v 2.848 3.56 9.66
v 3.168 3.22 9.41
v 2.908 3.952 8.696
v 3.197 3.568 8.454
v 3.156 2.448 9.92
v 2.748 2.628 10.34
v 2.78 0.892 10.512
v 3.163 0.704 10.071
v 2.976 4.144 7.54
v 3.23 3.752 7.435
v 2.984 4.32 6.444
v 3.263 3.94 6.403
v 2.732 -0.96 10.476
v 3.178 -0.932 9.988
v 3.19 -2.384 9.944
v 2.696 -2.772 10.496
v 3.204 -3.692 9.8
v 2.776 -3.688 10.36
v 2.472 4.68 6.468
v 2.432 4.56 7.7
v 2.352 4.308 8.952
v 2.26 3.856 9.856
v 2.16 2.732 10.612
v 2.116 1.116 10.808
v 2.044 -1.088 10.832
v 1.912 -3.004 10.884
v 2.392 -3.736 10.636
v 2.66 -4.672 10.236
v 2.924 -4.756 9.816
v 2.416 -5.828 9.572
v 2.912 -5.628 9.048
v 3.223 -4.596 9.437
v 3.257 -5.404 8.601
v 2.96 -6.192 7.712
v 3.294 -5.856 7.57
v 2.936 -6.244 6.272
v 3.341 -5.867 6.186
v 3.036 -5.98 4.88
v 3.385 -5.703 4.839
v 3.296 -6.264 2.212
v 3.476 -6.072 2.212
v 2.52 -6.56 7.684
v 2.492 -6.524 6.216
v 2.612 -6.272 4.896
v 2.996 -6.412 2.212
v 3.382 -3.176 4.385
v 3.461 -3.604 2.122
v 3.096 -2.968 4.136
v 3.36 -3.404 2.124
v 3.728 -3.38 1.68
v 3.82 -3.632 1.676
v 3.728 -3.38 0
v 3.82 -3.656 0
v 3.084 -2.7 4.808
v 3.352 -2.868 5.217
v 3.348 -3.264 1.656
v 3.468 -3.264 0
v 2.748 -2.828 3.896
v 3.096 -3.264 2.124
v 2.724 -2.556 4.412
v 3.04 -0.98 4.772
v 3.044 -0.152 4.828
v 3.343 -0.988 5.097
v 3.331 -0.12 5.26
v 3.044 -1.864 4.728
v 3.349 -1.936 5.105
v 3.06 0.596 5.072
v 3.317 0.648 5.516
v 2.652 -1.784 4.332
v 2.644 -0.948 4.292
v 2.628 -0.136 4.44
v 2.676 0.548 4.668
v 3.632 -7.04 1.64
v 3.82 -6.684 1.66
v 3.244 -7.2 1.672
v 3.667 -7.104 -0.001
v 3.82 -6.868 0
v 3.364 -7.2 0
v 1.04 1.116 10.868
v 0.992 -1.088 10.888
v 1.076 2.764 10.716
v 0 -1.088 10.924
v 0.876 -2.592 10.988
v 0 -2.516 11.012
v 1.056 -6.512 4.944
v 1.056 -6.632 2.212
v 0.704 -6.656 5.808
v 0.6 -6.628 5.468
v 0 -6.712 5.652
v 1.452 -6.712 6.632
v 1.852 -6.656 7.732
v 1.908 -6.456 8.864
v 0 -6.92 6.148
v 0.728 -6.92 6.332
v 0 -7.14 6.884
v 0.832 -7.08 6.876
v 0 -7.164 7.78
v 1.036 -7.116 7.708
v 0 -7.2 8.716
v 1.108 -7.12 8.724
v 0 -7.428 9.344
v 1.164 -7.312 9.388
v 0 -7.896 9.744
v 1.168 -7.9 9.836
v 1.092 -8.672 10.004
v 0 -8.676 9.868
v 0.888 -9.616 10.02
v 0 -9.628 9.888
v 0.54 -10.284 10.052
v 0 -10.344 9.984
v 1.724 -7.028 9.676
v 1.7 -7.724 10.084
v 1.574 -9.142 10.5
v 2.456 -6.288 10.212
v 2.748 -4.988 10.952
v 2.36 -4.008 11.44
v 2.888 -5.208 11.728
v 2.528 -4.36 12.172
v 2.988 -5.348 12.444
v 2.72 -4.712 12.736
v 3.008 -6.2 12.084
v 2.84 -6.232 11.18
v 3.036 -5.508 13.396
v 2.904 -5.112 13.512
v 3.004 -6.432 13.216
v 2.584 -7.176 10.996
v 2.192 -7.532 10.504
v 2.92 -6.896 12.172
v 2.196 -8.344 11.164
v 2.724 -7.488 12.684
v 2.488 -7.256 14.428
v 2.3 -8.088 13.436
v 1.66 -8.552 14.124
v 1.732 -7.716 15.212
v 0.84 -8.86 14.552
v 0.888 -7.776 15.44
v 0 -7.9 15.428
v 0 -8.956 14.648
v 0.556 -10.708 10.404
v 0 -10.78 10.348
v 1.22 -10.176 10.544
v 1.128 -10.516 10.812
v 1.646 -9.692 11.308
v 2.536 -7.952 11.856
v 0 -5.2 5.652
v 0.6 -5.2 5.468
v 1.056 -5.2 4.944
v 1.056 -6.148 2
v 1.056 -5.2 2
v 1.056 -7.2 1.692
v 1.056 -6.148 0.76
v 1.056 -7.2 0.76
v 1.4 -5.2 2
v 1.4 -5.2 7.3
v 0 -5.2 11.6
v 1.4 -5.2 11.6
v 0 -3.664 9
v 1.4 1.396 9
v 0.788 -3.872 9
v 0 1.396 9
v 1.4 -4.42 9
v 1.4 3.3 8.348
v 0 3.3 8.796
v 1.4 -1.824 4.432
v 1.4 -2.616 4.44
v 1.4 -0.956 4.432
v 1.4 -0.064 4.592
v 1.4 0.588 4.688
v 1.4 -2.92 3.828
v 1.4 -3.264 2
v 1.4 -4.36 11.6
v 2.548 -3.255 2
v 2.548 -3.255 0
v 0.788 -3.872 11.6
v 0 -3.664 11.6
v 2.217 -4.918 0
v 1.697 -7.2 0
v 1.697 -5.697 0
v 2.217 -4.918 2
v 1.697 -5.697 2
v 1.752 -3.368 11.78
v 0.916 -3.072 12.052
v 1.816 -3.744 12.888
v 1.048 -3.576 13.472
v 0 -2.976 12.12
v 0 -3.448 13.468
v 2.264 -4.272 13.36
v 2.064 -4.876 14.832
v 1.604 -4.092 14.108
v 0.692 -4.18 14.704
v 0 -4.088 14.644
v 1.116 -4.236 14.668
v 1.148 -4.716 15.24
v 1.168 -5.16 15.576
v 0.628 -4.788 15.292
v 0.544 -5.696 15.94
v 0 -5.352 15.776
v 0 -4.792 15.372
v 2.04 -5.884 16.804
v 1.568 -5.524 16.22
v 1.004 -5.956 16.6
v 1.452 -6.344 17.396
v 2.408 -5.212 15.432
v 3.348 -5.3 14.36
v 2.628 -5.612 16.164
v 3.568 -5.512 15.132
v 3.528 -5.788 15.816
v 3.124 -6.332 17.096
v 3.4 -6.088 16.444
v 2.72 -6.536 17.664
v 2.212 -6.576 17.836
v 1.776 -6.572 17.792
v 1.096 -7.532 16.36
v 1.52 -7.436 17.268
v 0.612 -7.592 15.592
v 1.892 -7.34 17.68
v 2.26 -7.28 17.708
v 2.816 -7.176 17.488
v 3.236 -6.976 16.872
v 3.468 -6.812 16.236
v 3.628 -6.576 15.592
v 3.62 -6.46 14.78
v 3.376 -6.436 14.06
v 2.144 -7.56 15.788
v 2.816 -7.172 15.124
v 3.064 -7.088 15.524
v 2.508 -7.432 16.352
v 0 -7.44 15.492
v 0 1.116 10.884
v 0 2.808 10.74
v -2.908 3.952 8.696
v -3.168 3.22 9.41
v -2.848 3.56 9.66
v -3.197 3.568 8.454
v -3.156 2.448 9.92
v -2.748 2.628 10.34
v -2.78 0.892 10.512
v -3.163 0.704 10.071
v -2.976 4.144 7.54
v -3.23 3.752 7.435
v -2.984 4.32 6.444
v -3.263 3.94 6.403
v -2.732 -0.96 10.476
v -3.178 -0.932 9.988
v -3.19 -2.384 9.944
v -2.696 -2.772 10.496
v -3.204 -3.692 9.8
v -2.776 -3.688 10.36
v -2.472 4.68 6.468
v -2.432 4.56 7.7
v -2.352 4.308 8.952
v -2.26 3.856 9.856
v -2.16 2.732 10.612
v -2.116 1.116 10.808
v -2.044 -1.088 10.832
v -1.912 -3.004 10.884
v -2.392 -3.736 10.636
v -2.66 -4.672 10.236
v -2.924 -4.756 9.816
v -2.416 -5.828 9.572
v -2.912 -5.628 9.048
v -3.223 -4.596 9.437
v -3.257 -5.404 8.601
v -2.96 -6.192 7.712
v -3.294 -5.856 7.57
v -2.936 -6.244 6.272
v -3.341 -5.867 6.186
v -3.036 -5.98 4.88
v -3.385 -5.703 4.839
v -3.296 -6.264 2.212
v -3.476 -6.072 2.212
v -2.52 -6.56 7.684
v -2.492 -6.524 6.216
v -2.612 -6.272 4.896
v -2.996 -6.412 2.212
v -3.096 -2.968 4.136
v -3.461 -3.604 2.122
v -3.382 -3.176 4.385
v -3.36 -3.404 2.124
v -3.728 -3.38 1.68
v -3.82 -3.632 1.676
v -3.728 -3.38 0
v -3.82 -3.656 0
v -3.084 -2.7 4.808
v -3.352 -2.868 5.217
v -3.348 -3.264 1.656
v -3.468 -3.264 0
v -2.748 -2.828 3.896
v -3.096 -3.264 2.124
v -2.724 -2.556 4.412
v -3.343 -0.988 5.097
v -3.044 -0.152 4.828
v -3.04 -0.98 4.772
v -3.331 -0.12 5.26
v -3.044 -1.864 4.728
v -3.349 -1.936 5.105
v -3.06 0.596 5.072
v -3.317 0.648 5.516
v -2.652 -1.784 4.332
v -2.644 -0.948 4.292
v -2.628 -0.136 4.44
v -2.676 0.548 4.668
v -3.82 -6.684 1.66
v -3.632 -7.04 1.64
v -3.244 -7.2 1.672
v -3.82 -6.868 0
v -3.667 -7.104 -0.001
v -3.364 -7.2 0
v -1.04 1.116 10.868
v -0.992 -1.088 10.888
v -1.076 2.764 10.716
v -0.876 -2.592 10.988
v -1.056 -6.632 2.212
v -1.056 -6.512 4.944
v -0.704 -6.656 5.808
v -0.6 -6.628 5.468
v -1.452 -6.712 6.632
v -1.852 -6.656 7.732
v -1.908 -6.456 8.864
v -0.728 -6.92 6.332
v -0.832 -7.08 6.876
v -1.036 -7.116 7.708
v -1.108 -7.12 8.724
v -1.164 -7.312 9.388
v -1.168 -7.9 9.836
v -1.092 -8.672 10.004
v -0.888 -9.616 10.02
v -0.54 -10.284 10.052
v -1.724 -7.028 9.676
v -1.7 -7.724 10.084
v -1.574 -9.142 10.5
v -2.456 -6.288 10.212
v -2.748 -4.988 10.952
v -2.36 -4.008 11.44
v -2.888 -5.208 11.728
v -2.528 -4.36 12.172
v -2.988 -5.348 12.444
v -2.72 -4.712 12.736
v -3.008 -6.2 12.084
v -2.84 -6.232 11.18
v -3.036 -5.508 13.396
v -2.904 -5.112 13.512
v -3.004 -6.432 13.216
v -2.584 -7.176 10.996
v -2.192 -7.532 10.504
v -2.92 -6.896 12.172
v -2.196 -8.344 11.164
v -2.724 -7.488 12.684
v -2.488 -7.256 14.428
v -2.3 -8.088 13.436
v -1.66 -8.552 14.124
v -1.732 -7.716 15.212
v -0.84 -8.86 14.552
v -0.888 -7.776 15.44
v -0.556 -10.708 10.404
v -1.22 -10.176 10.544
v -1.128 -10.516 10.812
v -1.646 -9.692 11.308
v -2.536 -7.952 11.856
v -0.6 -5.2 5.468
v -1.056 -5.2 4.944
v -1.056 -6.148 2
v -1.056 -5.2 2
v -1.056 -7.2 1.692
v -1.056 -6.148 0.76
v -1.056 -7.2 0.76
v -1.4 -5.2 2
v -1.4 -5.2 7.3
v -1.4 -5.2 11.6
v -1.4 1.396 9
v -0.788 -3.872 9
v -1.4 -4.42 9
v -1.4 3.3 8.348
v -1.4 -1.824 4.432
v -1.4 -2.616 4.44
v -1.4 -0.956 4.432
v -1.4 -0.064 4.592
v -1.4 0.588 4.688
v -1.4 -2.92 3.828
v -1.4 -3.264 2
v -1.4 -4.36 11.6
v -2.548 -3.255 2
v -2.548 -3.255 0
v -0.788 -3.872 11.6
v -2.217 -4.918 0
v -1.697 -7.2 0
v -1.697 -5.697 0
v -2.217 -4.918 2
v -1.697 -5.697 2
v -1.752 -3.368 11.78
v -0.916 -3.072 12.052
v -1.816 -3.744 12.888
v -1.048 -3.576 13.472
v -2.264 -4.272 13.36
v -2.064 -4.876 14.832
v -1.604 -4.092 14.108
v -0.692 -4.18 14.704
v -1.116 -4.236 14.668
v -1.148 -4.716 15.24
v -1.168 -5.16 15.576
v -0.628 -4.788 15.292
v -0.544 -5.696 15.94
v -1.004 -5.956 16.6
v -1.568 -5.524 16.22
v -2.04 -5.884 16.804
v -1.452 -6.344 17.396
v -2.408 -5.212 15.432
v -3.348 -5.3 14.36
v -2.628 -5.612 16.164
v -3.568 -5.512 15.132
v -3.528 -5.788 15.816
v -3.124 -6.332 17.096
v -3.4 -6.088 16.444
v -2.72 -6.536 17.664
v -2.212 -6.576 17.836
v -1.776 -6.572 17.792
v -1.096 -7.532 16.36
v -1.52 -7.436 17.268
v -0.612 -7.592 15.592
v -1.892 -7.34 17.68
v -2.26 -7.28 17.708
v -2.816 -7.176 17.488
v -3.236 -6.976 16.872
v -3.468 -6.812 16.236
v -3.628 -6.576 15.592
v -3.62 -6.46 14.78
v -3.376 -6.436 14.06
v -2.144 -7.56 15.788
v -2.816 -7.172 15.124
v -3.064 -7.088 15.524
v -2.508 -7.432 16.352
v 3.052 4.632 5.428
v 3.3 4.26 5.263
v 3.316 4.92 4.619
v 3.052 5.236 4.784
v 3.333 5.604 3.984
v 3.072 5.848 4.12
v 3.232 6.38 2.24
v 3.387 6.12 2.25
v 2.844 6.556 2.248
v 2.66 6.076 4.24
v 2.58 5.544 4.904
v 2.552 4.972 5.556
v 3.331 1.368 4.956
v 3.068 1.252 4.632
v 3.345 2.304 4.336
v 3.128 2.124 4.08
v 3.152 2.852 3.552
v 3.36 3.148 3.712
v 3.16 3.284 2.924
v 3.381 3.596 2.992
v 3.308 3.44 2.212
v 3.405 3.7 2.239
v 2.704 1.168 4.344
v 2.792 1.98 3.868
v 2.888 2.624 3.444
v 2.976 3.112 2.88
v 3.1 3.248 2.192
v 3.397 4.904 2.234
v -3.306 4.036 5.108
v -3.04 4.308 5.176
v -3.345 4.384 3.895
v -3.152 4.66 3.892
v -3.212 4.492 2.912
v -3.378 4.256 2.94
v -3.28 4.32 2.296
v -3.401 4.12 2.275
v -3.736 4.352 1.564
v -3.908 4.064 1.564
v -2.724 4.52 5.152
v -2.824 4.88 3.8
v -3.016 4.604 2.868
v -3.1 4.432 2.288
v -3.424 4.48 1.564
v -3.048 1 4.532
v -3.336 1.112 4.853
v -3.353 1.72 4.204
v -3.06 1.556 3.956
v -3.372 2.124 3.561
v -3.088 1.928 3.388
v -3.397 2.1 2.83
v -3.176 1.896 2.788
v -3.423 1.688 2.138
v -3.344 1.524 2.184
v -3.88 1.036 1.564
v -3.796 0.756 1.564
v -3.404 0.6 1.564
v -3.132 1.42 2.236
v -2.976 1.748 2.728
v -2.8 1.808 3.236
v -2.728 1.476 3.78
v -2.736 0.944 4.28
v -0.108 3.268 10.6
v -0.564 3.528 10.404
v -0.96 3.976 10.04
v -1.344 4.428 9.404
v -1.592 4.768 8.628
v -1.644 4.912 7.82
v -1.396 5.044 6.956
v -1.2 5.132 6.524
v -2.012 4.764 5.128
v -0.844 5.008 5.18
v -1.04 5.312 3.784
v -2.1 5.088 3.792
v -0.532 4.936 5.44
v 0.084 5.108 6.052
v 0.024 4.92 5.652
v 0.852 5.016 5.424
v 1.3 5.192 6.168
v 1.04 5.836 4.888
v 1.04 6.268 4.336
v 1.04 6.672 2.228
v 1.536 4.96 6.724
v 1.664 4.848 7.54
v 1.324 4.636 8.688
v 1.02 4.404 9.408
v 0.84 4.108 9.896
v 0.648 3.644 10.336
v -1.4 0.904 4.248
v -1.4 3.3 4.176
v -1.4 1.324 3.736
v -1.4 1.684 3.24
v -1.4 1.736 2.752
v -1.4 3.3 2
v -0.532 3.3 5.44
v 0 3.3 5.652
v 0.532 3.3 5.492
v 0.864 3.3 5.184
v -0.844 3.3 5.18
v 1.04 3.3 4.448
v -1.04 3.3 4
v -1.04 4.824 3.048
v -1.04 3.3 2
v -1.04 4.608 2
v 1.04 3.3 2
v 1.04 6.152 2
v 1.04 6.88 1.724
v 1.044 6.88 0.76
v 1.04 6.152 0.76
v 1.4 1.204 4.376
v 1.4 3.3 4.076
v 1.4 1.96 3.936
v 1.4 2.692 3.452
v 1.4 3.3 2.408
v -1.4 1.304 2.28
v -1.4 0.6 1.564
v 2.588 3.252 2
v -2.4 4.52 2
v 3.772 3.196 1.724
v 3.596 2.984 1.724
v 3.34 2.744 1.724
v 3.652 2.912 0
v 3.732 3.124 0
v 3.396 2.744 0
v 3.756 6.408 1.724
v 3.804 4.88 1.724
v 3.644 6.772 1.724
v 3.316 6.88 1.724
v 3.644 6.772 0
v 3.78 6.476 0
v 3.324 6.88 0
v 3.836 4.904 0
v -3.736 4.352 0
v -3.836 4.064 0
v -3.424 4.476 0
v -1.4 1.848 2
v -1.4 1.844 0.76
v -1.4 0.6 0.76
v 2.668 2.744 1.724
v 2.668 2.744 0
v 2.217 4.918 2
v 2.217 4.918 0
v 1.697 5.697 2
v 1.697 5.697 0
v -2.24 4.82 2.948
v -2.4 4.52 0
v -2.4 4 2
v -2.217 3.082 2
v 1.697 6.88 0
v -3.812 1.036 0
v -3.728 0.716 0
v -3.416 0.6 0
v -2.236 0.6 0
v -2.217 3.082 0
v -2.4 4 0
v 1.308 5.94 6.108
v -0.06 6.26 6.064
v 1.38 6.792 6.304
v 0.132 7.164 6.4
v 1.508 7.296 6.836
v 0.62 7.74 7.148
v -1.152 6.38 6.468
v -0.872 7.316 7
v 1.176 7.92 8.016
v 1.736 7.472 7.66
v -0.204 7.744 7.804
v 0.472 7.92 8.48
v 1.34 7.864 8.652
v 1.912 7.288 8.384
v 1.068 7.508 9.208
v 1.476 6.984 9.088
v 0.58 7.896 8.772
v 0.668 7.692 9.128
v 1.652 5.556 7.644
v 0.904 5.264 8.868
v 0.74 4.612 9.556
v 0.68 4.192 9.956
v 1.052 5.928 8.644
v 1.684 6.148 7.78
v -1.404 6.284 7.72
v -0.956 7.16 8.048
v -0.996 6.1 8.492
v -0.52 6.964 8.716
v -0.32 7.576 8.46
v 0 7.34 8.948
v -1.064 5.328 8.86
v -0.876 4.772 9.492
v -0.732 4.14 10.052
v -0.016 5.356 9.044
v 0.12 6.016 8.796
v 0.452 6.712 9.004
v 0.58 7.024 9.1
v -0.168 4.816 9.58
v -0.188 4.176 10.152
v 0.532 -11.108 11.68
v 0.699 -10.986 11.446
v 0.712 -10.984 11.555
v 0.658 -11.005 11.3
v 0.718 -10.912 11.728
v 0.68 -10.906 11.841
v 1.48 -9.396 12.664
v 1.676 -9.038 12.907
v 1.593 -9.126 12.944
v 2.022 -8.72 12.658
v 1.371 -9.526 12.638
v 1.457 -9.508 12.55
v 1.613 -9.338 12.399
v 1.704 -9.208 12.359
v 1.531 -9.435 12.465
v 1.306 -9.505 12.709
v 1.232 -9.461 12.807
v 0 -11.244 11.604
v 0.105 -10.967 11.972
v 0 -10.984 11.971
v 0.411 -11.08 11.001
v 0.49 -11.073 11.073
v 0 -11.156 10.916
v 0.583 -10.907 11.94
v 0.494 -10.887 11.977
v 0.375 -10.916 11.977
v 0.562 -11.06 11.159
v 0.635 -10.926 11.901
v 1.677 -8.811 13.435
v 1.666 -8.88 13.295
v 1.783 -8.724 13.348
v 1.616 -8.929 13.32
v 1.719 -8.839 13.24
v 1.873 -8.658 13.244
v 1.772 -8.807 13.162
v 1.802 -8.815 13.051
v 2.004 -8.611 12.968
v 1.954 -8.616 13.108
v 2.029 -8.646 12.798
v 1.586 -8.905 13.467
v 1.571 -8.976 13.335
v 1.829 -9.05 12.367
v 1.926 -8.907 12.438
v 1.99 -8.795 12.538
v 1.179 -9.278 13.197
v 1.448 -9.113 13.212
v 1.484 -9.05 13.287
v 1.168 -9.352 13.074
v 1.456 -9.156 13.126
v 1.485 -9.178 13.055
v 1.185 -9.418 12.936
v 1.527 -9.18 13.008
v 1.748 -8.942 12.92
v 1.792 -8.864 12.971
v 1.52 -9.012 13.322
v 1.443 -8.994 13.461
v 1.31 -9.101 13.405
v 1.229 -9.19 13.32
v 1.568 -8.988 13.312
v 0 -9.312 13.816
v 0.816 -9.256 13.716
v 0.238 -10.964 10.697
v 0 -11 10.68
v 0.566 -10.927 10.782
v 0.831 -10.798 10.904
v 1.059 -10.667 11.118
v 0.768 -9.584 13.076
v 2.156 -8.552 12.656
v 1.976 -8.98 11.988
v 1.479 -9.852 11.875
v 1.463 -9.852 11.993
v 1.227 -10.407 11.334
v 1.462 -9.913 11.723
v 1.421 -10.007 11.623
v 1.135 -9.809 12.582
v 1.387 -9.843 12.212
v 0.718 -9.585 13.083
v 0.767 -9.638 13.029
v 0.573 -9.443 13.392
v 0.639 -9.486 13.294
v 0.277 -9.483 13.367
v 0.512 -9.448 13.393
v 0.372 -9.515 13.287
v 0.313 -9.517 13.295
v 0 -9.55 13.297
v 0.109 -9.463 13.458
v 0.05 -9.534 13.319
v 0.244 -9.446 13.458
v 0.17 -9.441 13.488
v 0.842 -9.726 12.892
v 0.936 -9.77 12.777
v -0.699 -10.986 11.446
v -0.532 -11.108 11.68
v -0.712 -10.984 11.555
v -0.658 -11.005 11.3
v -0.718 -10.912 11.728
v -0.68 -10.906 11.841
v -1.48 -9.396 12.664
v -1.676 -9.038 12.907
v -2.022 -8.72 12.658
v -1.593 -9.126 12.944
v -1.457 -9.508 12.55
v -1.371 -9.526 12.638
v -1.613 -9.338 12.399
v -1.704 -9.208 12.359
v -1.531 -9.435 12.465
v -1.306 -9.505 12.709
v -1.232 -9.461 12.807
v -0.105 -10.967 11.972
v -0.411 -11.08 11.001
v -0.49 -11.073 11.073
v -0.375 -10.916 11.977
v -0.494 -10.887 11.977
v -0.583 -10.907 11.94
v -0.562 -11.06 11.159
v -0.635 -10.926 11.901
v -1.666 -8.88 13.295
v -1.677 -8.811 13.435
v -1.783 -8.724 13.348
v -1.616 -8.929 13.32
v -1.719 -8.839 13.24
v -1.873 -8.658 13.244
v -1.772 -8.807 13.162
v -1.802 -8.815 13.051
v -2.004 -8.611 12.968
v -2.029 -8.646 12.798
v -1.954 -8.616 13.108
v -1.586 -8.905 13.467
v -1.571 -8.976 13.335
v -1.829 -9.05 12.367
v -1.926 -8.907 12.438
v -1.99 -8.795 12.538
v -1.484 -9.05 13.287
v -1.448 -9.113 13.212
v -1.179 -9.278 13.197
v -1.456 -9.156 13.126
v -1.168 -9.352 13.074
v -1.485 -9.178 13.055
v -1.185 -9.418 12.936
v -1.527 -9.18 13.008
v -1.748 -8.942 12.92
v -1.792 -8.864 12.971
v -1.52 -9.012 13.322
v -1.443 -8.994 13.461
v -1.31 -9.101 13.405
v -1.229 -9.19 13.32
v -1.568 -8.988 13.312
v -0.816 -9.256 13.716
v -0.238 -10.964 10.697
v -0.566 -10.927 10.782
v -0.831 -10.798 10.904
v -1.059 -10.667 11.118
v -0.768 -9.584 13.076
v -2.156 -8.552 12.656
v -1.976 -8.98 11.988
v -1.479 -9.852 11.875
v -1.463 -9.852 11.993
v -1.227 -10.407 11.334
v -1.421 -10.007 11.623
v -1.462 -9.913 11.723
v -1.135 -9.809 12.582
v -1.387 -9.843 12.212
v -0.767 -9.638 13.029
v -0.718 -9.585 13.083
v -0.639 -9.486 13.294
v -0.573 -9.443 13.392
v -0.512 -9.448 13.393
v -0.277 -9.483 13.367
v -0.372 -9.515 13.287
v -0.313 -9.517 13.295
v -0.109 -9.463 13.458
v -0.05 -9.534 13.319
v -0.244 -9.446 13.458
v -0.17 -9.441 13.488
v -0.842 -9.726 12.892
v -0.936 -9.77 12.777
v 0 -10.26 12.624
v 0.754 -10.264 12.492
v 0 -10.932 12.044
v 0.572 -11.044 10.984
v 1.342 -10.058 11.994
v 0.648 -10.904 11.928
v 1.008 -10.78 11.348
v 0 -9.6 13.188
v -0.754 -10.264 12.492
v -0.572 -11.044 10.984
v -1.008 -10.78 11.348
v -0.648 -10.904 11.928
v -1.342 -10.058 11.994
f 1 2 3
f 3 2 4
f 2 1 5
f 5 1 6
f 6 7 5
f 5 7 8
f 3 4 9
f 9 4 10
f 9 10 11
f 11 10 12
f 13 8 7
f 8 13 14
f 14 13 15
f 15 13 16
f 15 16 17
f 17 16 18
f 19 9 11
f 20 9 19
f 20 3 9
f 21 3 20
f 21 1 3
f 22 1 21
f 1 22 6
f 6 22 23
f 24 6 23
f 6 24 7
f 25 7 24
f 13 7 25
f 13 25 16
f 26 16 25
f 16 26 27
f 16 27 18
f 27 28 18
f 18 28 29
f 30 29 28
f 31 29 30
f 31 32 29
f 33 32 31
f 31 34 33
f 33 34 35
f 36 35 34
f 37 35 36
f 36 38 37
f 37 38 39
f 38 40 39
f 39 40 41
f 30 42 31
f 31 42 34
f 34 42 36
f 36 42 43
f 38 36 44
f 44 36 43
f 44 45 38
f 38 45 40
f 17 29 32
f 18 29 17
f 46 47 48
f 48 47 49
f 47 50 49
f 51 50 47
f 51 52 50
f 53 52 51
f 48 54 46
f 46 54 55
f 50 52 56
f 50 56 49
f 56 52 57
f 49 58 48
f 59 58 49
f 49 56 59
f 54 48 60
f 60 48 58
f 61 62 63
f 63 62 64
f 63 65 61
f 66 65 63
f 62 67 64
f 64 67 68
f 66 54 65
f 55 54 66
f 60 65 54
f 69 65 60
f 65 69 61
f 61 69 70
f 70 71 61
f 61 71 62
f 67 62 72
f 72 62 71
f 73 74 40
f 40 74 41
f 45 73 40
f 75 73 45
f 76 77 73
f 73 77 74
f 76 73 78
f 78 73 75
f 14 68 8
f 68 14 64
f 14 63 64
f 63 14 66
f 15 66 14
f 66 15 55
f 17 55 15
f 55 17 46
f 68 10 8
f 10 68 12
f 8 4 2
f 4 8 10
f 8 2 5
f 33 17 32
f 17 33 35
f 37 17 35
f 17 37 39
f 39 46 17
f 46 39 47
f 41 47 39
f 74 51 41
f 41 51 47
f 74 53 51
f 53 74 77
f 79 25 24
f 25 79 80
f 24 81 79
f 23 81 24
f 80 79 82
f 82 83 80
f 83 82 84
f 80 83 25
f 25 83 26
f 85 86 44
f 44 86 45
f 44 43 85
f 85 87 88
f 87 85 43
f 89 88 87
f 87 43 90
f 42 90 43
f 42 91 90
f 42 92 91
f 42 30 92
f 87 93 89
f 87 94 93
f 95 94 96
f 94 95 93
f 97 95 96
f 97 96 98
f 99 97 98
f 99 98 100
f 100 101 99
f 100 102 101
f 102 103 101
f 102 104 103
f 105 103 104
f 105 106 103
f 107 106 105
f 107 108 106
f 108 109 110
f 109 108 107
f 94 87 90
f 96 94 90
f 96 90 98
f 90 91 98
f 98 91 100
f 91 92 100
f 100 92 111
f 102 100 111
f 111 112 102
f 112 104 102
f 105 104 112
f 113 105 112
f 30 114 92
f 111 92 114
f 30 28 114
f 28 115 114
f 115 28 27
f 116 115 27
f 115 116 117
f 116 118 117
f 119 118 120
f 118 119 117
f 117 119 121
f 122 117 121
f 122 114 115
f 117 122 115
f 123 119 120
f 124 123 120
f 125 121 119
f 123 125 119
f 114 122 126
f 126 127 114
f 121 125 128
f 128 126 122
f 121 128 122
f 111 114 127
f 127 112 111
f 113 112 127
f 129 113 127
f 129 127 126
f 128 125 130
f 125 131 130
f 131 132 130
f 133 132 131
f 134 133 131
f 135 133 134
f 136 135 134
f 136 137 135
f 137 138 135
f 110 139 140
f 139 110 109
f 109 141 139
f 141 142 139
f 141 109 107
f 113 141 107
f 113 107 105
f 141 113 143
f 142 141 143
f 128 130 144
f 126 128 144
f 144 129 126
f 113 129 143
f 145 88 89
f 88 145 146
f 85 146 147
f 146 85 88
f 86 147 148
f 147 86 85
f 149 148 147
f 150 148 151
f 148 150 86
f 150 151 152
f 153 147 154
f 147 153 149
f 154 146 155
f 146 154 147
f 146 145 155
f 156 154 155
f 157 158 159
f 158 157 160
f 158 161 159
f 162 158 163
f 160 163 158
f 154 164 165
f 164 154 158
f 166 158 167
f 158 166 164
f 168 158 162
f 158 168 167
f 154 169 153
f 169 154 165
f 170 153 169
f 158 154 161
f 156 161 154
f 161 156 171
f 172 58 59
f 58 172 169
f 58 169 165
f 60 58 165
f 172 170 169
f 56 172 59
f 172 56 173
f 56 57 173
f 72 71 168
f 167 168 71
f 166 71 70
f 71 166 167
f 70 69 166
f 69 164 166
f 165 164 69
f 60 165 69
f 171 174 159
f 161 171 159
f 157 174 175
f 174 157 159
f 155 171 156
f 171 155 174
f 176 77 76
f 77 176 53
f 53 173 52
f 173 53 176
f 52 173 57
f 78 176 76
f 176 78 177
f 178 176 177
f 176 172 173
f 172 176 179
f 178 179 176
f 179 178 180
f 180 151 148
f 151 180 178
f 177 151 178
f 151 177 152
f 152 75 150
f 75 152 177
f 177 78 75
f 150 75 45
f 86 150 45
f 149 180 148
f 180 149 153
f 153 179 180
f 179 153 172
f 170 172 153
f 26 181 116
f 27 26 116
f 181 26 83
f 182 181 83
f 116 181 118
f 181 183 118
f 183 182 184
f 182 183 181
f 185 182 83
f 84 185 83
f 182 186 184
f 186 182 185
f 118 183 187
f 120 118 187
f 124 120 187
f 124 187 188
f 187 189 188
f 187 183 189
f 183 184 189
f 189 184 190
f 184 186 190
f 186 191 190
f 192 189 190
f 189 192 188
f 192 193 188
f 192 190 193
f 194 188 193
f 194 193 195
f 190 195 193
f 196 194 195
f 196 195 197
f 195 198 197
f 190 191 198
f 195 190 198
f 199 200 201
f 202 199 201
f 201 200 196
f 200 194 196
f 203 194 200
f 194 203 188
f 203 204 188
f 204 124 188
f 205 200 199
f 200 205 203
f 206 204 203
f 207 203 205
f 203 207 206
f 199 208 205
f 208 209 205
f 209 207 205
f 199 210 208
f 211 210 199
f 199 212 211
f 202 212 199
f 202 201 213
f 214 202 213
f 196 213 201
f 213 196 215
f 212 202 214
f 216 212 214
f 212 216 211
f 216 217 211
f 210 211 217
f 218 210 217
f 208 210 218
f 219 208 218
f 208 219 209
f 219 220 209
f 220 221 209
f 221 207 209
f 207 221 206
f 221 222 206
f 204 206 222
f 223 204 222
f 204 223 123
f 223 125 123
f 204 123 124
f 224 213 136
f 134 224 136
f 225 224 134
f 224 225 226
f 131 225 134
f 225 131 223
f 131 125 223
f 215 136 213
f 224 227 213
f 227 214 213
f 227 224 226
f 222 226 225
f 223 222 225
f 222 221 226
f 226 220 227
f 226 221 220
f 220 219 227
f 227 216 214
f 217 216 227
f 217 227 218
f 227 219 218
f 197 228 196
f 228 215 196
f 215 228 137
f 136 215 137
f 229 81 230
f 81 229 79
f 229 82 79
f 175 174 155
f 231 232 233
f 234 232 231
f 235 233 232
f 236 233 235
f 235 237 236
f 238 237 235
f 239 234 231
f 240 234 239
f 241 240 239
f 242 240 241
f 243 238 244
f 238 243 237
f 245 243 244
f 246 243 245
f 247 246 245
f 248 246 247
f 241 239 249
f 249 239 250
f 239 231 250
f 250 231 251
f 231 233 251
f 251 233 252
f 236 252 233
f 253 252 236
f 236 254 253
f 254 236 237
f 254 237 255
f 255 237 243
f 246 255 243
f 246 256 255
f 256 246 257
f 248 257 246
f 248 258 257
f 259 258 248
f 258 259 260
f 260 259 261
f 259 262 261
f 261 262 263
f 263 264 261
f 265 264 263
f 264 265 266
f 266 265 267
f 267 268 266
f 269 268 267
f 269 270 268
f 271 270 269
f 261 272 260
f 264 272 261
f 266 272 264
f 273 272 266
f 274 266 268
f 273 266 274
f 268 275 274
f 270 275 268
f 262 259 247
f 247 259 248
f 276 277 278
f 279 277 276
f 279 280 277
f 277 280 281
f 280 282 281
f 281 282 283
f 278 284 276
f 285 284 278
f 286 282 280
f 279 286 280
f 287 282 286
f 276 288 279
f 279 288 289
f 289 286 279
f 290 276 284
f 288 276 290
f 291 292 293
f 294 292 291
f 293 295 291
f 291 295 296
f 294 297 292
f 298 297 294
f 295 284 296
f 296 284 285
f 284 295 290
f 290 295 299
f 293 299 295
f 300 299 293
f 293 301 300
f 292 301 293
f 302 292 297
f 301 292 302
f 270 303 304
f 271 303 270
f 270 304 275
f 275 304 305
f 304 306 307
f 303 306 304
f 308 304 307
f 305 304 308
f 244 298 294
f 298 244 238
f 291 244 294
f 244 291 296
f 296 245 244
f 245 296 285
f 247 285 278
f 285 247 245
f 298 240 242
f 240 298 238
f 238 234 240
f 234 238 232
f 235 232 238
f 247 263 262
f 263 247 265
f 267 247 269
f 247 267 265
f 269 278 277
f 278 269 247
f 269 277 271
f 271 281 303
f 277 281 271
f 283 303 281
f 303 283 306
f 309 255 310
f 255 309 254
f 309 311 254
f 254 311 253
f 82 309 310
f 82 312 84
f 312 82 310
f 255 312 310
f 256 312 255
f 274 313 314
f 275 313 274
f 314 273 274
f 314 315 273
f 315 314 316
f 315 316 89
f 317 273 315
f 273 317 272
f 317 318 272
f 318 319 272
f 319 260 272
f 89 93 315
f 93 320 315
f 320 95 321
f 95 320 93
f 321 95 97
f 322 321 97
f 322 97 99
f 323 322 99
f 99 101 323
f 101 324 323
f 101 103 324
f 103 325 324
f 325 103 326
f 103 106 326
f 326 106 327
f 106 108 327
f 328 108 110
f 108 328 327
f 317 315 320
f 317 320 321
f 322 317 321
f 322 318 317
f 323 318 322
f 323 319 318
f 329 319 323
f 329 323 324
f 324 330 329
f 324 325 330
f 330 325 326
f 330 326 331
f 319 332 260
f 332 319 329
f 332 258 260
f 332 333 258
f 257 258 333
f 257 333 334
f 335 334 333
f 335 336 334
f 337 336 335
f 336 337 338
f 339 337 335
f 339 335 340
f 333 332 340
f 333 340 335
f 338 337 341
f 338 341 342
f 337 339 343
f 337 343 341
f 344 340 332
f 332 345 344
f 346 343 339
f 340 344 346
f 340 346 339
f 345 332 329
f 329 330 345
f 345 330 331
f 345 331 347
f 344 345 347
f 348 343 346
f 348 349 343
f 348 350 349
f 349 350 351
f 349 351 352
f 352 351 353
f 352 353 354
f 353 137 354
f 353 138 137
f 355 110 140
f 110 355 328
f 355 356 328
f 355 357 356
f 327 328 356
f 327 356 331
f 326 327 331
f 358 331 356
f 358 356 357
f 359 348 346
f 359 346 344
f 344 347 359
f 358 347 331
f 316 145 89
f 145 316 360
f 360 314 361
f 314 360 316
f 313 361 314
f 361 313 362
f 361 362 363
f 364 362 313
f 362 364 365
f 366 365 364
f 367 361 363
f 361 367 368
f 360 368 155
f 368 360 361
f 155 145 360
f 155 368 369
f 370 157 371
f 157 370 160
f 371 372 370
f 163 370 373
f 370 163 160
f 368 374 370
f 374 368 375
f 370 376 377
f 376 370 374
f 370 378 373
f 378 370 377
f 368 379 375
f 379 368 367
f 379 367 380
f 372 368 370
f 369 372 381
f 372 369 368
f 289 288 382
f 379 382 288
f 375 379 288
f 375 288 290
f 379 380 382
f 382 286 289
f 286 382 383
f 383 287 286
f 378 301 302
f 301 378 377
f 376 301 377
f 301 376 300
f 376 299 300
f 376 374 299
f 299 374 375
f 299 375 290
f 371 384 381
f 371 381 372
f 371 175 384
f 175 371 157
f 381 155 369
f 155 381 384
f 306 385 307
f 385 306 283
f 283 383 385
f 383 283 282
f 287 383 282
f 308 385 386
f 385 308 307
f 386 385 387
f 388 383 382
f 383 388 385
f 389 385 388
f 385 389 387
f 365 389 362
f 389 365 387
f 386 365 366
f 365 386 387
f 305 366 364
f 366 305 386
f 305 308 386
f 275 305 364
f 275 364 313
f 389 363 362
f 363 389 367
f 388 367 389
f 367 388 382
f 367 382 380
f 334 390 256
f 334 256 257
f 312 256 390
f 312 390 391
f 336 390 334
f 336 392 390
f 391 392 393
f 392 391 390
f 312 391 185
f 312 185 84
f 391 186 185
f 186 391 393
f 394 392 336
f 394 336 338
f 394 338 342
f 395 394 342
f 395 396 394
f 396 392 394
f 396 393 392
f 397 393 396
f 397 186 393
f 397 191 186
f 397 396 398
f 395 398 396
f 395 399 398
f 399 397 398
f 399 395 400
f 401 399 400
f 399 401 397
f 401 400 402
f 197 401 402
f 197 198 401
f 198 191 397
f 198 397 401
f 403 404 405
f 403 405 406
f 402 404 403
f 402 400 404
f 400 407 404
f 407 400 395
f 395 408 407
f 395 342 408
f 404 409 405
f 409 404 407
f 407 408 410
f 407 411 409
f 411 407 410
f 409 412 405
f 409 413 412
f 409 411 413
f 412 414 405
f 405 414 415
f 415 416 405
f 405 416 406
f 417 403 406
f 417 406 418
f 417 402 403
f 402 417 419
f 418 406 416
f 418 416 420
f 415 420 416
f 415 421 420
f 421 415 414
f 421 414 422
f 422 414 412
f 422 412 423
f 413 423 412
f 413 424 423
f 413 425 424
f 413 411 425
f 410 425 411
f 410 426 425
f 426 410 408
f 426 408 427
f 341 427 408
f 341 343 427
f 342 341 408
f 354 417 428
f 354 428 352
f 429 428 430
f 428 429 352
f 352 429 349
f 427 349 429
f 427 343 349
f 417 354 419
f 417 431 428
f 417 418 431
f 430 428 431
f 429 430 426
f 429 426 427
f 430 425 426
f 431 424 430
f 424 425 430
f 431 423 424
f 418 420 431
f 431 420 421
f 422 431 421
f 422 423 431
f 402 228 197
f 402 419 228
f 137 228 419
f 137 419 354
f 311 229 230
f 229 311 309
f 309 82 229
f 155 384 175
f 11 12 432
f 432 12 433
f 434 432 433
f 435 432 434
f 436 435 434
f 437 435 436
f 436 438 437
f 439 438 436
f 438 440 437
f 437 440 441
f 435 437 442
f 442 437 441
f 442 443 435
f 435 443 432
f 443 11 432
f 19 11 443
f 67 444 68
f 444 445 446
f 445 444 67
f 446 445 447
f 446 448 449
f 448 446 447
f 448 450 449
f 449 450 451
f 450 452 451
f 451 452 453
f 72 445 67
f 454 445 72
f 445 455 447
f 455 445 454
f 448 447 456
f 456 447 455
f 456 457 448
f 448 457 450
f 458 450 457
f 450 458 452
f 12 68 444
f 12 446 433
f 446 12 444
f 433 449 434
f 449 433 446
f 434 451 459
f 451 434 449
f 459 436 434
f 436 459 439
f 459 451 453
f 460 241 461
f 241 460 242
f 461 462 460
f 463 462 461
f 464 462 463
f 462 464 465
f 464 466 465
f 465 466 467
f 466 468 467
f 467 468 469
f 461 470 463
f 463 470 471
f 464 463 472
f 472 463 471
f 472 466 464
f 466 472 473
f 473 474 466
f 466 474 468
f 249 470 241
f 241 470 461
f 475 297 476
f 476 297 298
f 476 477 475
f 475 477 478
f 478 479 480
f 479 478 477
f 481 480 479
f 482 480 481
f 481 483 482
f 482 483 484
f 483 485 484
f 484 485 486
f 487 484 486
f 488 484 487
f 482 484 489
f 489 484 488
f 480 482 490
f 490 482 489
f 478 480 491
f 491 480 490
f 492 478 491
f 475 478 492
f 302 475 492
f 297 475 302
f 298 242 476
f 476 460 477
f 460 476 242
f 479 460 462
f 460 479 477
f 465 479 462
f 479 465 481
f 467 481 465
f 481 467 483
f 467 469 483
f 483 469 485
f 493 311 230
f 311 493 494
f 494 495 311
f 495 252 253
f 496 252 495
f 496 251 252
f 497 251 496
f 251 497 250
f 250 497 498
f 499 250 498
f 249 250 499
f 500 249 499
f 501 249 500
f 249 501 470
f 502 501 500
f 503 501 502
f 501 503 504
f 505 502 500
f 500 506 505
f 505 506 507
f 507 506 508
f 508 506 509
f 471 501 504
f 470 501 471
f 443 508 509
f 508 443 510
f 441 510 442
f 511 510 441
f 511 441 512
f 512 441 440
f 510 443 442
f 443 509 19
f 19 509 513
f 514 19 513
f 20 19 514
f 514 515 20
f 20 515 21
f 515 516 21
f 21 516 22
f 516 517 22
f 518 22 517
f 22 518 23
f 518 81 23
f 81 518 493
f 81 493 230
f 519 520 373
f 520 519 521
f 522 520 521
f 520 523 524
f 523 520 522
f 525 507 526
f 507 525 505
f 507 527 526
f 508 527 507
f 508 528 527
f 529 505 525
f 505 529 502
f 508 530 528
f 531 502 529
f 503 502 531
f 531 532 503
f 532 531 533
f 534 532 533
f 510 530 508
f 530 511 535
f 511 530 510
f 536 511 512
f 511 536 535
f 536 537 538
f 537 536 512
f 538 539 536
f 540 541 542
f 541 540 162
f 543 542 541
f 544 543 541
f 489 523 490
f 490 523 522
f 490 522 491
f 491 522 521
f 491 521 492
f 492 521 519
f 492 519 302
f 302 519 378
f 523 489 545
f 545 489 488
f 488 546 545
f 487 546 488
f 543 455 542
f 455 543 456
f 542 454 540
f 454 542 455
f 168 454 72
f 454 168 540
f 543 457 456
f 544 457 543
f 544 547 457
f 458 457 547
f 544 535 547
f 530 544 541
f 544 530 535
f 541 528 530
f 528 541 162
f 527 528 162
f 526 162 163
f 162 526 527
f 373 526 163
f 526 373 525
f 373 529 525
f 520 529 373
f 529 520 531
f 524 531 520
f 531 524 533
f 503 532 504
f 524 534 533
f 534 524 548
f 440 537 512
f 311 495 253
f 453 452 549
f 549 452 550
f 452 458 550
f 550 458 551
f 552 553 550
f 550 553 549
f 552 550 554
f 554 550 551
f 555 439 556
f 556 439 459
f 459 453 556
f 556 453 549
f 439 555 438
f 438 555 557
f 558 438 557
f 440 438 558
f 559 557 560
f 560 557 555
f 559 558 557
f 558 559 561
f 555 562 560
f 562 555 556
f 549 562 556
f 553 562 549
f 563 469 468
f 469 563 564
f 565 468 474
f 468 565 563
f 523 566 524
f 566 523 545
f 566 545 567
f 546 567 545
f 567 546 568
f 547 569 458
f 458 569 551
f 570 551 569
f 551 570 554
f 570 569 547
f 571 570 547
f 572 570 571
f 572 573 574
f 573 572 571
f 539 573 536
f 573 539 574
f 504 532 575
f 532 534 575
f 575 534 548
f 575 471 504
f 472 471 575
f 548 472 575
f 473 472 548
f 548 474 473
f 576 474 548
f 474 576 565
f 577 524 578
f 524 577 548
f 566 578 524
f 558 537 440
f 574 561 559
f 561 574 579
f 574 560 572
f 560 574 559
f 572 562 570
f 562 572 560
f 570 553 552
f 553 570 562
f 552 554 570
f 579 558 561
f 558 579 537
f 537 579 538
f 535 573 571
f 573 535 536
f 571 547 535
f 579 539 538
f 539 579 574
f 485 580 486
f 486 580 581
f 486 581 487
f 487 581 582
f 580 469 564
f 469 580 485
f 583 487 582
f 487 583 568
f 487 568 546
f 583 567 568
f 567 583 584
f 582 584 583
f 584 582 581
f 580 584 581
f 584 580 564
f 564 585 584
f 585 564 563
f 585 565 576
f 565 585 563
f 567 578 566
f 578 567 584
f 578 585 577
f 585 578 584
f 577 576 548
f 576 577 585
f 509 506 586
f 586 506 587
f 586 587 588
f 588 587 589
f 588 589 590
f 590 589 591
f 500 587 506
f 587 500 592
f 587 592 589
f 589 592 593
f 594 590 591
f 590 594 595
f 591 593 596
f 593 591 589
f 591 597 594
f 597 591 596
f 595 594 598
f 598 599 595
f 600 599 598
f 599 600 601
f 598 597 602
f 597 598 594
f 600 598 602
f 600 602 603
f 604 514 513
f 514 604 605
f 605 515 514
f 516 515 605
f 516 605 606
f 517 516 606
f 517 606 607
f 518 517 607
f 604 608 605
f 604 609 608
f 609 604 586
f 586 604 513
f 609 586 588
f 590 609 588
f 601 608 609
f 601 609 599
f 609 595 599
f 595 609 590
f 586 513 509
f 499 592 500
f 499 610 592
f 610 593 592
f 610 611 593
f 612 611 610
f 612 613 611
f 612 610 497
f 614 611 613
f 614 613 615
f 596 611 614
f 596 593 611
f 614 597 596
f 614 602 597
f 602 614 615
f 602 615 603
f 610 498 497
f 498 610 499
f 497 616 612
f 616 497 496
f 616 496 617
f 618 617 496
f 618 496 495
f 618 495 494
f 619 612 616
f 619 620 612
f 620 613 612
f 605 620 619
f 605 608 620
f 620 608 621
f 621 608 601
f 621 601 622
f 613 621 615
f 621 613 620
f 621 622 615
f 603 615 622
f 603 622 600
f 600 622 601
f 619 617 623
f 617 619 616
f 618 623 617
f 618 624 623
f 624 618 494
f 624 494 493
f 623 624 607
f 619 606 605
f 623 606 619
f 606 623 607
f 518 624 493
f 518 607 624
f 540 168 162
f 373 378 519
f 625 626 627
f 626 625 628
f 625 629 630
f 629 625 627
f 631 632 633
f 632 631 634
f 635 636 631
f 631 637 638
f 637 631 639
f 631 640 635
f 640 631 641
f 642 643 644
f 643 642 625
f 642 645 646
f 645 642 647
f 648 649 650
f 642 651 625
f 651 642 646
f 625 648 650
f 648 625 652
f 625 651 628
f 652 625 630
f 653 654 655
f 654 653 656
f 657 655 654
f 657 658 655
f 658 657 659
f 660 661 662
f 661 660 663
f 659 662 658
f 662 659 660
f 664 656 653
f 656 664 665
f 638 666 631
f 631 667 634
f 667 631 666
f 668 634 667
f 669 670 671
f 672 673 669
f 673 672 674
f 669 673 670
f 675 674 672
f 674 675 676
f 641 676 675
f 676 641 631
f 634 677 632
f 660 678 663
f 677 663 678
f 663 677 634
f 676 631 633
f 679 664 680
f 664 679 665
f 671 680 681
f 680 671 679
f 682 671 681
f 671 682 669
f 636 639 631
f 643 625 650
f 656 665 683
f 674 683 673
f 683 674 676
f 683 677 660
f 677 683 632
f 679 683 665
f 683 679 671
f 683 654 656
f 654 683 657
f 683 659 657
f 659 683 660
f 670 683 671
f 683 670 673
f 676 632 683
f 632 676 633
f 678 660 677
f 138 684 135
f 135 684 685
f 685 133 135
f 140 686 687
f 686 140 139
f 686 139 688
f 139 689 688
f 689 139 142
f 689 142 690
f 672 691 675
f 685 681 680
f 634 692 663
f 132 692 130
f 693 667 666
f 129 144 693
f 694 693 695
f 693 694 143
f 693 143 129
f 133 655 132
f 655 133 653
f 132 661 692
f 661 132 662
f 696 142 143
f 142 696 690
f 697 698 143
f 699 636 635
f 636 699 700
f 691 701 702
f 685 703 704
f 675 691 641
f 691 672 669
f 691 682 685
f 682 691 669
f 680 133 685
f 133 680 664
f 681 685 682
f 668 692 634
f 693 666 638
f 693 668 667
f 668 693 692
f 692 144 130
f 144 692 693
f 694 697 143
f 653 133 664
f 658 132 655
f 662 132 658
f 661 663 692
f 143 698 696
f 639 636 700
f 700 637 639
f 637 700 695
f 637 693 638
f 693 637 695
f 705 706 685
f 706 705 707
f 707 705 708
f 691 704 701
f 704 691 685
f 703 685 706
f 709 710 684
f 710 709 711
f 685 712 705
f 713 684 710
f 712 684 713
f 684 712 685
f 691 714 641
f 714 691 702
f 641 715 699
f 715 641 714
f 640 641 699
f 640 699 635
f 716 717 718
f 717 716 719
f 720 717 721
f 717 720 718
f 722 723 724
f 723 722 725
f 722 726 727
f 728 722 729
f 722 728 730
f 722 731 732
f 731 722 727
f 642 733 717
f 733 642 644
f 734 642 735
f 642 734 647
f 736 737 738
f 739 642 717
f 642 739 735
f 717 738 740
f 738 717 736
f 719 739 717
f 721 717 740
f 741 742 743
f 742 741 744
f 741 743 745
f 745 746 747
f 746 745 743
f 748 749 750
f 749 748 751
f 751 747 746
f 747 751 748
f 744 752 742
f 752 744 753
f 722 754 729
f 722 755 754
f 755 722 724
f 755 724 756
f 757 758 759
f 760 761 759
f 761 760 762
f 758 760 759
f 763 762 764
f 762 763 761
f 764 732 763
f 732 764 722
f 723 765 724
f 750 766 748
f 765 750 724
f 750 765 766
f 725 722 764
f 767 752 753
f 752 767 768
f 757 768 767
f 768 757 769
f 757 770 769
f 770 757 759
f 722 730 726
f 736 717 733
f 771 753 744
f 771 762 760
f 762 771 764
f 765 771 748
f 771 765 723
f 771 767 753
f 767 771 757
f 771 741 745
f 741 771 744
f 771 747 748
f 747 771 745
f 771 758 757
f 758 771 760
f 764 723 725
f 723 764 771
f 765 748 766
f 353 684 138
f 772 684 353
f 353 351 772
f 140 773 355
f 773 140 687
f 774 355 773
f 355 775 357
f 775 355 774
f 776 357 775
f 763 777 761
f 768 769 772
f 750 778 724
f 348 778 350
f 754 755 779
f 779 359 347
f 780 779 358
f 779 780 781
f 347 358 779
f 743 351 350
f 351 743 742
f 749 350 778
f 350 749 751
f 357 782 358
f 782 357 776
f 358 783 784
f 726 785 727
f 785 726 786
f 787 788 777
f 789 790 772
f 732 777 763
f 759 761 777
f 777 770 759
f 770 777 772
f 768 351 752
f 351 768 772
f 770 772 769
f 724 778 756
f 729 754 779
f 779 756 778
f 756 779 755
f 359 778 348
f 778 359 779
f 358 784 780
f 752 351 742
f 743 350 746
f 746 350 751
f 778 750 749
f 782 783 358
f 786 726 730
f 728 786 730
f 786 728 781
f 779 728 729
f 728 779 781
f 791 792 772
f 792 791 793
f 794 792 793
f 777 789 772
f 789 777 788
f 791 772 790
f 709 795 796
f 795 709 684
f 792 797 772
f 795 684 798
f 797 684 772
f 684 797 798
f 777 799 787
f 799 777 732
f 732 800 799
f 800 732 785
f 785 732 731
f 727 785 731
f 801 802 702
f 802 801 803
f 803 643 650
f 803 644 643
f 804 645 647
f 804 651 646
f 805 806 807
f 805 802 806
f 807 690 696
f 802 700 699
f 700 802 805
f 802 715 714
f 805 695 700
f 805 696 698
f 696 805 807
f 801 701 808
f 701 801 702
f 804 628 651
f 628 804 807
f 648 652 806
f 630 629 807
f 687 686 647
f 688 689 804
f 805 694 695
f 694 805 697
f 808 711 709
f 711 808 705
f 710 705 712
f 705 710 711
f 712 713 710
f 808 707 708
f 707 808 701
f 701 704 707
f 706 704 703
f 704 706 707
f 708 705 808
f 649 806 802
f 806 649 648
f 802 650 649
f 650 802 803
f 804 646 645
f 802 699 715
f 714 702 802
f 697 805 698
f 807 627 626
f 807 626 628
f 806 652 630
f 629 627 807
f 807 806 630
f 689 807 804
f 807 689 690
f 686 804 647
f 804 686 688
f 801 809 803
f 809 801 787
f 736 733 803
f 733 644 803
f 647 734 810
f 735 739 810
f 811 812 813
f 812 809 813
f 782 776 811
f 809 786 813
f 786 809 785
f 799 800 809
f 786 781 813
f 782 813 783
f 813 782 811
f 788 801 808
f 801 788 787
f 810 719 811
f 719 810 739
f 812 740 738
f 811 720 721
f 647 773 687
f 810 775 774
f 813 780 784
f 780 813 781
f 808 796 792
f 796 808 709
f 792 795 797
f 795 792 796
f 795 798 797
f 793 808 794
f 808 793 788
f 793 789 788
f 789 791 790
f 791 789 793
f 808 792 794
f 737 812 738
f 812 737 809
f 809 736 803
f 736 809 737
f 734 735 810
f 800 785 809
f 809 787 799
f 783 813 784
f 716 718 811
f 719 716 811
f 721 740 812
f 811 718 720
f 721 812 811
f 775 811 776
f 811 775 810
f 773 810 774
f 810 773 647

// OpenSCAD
use <../lib.scad>
use <s/2889p01s01.scad>
use <s/2889p01s02.scad>
use <s/2889s01.scad>
function ldraw_lib__2889p02() = [
// 0 Animal Dog Alsatian / German Shepherd Puppy with Black Eyes and Nose and Light Bluish Grey Muzzle Pattern
// 0 Name: 2889p02.dat
// 0 Author: Philippe Hurbain [Philo]
// 0 !LDRAW_ORG Part UPDATE 2026-03
// 0 !LICENSE Licensed under CC BY 4.0 : see CAreadme.txt
// 
// 0 BFC CERTIFY CCW
  [0,"BFC","CERTIFY"],
  [0,"BFC","CCW"],
// 
// 0 !KEYWORDS Bricklink 2889pb02, Brickowl 499870, Brickset 108171, CMF
// 0 !KEYWORDS Dungeons and Dragons, Rebrickable 02889pr0002, Set 71047-6
// 
// 0 !HISTORY 2026-03-31 [OrionP] Official Update 2026-03
// 
// 1 16 0 0 0 1 0 0 0 1 0 0 0 1 s\2889s01.dat
  [1,16,0,0,0,1,0,0,0,1,0,0,0,1, ldraw_lib__s__2889s01()],
// 1 16 0 0 0 1 0 0 0 1 0 0 0 1 s\2889p01s01.dat
  [1,16,0,0,0,1,0,0,0,1,0,0,0,1, ldraw_lib__s__2889p01s01()],
// 1 16 0 0 0 -1 0 0 0 1 0 0 0 1 s\2889p01s01.dat
  [1,16,0,0,0,-1,0,0,0,1,0,0,0,1, ldraw_lib__s__2889p01s01()],
// 1 71 0 0 0 1 0 0 0 1 0 0 0 1 s\2889p01s02.dat
  [1,71,0,0,0,1,0,0,0,1,0,0,0,1, ldraw_lib__s__2889p01s02()],
// 1 71 0 0 0 -1 0 0 0 1 0 0 0 1 s\2889p01s02.dat
  [1,71,0,0,0,-1,0,0,0,1,0,0,0,1, ldraw_lib__s__2889p01s02()],
];
module ldraw_lib__2889p02(step=0, col=false, unit=2/5, alt=false, line=0.2, solid=!$preview)
    makepoly(ldraw_lib__2889p02(), step=step, col=col, unit=unit, alt=alt, line=line, solid=solid);
ldraw_lib__2889p02(line=0.2);
